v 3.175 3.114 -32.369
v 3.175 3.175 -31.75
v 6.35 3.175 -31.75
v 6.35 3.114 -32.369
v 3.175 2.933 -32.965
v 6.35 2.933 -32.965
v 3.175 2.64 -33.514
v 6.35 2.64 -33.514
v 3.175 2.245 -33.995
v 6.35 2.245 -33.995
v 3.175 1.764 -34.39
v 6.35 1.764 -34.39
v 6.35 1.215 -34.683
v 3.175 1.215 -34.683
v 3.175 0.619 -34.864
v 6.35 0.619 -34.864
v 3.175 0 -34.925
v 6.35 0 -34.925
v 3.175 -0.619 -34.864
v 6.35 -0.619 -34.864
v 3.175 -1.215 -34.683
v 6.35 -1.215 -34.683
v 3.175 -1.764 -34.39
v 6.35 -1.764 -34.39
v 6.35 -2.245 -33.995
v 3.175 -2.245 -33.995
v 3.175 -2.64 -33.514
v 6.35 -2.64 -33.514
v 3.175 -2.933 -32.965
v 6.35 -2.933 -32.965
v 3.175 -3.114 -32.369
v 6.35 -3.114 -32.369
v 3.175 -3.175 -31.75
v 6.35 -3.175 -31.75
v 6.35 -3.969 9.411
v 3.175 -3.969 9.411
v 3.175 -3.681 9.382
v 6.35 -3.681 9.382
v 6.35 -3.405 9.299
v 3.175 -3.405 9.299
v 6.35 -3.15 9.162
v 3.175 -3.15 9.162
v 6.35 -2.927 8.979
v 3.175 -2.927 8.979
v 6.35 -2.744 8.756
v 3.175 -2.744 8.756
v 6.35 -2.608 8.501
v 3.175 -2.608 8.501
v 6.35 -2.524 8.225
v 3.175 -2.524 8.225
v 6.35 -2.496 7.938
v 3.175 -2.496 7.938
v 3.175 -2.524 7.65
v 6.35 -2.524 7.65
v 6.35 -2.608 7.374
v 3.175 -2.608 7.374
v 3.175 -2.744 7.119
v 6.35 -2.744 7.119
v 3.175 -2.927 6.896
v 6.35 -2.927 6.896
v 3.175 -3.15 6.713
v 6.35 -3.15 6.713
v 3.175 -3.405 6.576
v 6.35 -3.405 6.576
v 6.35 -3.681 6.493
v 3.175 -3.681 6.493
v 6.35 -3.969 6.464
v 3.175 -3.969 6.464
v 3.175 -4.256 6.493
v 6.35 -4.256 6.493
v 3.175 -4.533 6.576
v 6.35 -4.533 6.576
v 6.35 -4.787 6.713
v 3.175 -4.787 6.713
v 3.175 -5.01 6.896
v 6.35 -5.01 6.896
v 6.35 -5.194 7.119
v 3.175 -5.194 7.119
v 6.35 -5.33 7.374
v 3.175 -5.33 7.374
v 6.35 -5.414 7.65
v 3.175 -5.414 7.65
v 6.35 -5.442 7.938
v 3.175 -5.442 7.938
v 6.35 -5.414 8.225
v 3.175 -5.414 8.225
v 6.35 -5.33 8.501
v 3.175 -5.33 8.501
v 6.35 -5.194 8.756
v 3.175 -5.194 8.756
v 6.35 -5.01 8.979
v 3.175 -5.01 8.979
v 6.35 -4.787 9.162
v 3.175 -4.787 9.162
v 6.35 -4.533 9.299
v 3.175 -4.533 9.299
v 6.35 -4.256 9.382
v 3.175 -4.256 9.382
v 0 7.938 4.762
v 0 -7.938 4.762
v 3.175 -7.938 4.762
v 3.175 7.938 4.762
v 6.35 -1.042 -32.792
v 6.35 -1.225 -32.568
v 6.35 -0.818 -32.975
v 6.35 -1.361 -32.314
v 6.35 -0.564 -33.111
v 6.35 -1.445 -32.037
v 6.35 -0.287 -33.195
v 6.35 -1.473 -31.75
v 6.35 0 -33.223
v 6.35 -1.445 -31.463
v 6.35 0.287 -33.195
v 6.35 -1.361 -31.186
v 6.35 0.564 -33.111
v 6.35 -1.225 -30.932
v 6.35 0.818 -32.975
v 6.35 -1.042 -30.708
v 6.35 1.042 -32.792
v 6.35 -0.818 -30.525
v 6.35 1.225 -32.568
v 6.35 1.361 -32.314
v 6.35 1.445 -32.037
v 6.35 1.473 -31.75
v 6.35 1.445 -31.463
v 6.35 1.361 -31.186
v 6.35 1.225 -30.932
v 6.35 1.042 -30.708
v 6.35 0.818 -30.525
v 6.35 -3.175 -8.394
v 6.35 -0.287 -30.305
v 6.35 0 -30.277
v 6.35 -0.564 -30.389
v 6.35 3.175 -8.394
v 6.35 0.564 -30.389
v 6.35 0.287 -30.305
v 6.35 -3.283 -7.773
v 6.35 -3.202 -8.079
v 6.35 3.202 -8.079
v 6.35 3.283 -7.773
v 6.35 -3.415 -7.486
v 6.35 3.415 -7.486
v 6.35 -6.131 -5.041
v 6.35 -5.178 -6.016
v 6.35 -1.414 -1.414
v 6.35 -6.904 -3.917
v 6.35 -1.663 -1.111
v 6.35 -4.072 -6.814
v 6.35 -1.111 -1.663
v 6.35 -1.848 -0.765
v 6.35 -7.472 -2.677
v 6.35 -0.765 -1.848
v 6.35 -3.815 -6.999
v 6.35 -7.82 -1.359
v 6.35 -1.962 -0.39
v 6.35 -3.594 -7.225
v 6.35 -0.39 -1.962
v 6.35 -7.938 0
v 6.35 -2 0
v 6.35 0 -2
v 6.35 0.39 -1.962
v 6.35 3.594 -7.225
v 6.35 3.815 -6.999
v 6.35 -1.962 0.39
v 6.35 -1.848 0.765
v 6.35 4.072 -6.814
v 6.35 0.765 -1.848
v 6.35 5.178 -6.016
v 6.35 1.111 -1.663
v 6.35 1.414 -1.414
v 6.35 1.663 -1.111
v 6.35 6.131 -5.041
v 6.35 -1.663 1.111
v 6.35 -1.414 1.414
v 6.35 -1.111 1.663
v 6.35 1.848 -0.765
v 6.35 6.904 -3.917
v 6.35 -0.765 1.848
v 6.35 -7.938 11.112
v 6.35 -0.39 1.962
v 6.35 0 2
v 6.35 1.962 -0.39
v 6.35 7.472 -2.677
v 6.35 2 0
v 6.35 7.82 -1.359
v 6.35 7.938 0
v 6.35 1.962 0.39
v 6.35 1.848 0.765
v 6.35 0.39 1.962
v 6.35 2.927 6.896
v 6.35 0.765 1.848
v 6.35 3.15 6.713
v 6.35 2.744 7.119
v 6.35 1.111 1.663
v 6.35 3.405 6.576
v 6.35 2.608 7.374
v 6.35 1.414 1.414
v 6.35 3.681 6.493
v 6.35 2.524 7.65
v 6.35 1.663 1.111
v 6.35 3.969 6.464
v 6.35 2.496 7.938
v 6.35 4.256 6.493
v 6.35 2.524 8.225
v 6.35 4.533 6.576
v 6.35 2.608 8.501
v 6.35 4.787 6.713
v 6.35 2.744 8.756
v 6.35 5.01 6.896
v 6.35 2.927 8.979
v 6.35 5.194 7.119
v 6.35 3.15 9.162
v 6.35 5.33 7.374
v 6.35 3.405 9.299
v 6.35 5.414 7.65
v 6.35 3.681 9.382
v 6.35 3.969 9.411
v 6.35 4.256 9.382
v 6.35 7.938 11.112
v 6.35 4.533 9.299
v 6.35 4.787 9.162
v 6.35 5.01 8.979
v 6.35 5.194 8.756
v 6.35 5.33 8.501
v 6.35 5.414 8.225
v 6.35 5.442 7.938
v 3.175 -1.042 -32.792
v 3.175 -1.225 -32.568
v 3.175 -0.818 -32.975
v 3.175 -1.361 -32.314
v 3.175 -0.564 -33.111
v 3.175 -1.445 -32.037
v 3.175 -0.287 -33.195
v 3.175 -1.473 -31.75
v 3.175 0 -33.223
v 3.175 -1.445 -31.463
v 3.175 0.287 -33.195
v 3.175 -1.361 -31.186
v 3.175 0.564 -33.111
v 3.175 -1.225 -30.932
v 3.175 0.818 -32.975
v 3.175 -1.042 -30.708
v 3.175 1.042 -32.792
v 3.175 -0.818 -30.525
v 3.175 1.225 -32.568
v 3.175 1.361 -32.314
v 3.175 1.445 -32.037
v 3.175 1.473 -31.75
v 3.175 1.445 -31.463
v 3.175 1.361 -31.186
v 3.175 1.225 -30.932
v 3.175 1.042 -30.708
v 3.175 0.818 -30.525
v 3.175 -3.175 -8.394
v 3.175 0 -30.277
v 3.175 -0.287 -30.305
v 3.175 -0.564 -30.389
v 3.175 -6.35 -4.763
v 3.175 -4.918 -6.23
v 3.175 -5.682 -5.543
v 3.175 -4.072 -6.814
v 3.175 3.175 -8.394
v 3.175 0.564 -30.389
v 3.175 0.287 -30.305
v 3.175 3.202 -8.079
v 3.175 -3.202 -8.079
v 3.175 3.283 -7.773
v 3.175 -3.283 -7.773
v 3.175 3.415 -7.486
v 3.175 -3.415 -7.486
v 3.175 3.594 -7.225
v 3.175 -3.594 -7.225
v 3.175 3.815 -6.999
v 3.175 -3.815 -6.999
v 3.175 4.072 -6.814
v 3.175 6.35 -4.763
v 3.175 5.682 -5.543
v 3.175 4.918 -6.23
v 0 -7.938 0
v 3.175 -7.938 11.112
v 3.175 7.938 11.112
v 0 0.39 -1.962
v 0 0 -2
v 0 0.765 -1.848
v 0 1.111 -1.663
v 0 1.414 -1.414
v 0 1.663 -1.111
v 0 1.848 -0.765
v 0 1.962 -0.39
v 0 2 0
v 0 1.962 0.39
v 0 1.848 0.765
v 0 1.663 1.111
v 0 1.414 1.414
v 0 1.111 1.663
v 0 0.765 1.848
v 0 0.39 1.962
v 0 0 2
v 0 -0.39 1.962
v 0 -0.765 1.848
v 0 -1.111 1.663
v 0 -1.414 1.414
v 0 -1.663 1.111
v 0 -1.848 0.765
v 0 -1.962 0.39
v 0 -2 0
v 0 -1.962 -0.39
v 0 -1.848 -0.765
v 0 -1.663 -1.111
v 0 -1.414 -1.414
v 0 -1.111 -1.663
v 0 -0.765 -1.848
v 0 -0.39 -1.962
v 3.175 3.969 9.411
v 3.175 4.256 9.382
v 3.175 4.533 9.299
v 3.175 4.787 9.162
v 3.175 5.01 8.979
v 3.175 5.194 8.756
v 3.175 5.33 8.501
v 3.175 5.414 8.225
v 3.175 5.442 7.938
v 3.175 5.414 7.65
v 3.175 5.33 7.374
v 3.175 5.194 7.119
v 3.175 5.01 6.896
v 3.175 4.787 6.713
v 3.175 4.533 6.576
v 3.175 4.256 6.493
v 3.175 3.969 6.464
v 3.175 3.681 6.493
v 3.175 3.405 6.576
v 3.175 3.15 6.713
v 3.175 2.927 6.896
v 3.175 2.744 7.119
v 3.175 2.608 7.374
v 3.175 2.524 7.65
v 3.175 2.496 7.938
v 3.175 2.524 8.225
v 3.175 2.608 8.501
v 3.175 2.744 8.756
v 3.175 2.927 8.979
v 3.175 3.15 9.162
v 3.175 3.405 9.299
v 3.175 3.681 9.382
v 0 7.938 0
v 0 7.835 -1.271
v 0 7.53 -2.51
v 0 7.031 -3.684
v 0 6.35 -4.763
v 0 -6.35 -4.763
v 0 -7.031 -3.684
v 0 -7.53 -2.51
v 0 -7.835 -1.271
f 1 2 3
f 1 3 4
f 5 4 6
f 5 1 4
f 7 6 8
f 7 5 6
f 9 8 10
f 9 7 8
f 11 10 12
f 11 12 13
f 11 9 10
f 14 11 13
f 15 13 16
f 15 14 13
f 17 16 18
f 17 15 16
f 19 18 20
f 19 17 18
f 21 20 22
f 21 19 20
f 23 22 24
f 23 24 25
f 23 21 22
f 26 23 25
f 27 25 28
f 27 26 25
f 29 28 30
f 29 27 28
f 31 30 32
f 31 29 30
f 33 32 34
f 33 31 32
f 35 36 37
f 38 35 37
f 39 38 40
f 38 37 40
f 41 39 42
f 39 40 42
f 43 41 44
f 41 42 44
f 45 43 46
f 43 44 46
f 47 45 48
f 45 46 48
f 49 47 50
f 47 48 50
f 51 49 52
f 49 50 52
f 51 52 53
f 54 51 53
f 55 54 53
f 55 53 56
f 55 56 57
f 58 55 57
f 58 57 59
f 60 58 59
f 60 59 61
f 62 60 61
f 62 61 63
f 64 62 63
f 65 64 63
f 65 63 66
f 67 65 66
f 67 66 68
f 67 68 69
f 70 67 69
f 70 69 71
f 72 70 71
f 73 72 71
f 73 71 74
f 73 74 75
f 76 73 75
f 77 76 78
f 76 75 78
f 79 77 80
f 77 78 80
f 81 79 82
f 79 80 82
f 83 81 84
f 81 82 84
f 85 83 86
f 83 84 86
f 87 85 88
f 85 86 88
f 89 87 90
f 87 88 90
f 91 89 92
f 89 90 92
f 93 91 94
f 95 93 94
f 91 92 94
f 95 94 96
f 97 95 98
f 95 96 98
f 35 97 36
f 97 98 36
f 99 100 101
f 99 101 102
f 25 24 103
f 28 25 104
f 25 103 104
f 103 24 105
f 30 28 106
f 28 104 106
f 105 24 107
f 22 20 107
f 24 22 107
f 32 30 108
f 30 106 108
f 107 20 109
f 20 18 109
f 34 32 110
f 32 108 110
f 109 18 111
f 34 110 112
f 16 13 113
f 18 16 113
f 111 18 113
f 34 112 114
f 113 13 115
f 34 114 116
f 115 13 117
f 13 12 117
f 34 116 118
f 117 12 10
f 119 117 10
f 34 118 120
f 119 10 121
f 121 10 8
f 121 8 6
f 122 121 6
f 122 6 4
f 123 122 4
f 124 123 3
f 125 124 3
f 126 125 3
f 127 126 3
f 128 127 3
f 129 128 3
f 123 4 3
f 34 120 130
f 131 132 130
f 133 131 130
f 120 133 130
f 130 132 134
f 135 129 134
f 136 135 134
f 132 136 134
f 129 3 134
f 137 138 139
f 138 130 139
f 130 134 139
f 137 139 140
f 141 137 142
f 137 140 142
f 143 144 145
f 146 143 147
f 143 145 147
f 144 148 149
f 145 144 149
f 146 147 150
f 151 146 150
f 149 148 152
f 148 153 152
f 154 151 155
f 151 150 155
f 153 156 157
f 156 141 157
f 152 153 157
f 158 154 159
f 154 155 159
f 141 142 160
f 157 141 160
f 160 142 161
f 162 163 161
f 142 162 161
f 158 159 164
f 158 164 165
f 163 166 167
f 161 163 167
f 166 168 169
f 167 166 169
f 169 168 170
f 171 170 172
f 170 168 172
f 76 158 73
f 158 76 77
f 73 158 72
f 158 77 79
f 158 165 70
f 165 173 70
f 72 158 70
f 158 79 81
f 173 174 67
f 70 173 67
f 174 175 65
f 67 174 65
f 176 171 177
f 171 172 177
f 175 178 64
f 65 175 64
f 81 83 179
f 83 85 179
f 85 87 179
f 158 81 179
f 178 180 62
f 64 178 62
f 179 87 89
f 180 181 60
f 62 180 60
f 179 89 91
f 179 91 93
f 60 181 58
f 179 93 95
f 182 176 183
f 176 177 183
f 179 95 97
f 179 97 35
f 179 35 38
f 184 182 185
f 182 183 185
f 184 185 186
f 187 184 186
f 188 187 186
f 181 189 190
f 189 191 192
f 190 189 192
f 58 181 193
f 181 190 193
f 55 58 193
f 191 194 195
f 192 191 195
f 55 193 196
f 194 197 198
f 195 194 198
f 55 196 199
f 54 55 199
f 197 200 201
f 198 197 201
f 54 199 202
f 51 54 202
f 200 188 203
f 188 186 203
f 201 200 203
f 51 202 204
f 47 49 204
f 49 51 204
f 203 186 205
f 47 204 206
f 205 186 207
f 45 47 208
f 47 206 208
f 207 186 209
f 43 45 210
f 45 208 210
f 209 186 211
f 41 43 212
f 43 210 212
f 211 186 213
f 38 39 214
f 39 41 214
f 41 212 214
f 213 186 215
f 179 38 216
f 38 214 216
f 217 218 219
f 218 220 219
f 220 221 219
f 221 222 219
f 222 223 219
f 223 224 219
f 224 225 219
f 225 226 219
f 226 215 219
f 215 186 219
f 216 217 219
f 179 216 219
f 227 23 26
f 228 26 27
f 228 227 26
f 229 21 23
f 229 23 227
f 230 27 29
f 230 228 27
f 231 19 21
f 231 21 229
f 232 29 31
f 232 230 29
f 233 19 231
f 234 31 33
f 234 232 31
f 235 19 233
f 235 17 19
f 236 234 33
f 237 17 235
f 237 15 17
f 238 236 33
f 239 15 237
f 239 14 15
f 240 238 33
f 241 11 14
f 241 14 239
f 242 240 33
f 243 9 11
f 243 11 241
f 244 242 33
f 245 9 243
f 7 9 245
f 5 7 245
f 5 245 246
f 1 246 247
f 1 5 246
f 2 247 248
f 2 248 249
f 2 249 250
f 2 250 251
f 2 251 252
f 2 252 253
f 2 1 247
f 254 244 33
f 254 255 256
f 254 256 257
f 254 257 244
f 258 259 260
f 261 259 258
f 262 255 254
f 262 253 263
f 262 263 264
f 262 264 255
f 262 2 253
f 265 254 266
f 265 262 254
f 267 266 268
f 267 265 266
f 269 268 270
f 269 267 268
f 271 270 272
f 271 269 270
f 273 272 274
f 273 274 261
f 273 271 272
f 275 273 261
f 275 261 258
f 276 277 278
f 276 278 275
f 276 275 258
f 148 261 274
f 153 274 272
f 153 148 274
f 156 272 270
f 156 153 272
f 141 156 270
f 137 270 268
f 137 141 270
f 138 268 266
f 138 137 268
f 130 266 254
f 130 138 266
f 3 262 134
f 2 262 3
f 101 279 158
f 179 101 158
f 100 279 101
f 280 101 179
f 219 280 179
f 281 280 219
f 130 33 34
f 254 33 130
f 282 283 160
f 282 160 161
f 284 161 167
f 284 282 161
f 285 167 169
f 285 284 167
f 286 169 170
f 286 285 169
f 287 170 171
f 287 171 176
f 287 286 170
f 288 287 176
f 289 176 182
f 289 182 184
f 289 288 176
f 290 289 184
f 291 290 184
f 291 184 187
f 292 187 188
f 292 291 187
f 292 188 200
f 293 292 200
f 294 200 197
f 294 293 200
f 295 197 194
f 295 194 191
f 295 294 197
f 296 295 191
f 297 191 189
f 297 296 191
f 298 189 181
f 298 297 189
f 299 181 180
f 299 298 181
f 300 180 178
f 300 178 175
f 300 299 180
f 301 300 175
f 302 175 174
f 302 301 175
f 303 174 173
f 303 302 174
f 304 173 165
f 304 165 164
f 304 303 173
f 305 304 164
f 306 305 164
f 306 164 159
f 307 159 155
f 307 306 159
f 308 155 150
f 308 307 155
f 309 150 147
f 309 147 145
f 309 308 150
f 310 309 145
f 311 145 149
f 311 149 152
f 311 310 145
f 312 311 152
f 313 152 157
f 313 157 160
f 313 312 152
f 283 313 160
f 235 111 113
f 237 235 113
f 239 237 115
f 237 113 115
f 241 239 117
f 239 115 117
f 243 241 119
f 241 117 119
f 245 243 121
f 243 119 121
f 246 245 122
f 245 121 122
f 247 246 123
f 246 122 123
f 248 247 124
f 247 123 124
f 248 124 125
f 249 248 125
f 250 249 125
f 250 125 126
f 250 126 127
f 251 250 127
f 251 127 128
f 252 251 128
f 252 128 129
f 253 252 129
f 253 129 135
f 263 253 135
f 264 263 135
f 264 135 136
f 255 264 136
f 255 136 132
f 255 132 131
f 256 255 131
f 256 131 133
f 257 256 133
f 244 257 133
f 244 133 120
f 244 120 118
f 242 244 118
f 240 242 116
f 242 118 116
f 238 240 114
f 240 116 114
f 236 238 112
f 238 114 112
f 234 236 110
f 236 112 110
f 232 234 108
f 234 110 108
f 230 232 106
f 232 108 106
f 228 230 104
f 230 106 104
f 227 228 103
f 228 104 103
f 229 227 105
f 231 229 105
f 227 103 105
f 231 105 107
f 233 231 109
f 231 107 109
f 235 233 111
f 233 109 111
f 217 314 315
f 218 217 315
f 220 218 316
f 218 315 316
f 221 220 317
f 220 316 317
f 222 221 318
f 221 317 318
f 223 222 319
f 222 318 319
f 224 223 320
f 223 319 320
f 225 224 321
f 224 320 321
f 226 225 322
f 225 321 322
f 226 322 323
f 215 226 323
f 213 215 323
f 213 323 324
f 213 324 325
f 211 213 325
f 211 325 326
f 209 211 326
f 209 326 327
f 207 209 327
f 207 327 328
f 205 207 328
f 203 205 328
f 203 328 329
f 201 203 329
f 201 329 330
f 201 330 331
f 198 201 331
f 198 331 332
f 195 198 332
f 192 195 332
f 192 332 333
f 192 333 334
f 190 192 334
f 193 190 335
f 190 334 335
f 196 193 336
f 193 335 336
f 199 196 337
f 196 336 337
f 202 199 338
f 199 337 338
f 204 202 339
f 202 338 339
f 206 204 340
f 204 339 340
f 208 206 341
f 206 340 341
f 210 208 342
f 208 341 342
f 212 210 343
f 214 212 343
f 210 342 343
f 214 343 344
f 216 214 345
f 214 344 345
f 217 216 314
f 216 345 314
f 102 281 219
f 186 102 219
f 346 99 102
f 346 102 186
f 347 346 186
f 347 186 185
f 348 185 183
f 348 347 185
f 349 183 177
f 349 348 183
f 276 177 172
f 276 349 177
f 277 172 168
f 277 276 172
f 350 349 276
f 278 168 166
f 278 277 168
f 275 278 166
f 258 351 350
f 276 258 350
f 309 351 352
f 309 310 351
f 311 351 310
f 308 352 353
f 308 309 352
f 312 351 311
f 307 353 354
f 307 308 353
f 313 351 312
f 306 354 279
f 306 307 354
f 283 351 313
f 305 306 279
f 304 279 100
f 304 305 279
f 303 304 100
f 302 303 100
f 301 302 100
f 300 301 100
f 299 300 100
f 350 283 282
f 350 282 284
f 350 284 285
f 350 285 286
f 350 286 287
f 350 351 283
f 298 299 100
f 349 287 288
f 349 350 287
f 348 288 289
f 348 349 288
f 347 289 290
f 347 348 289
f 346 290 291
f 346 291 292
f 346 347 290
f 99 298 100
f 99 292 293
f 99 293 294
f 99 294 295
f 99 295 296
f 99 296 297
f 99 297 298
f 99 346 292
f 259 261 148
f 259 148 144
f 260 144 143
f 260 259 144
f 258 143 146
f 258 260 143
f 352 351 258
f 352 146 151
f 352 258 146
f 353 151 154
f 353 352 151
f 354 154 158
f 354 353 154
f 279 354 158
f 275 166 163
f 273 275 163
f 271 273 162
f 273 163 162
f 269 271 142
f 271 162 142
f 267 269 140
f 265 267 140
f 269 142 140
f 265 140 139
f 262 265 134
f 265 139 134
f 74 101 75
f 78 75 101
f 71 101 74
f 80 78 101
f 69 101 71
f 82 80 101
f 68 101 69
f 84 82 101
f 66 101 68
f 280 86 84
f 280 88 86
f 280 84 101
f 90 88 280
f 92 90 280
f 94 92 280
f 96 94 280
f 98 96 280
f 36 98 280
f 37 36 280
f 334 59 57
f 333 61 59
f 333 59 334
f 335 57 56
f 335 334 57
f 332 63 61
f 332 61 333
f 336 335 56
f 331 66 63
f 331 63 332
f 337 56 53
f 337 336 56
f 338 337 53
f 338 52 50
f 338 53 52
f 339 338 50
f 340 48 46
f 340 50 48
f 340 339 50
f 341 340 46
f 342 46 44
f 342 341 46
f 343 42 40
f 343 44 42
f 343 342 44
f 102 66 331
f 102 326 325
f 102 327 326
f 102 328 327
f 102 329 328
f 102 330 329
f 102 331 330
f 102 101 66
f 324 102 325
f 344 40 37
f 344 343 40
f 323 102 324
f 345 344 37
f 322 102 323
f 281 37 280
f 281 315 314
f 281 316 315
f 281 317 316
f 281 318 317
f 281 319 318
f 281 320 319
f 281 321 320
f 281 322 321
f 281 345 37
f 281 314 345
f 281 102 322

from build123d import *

# Parameters (mm, degrees)
SKETCH1_R             = 2
BOSS_EXTRUDE1_DEPTH   = 6.35
FILLET1_R             = 1.8415
SKETCH2_W             = 6.35
SKETCH2_H             = 15.875
SKETCH2_W_2           = 42.387227331
SKETCH2_H_2           = 26.263521184
CUT_EXTRUDE1_DEPTH    = 3.175
F_4_CLEARANCE_HOLE1_D = 2.9464
F_4_CLEARANCE_HOLE2_D = 2.9464


with BuildPart() as part:
    # Sketch1 → Boss-Extrude1 (new body)
    with BuildSketch(Plane(origin=(0, 0, 0), x_dir=(0, 0, -1), z_dir=(1, 0, 0))):
        with BuildLine():
            Line((-11.1125, 7.9375), (0, 7.9375))
            ThreePointArc((0, 7.9375), (4.3475478, 6.640988961), (7.274838916, 3.175))
            Line((7.274838916, 3.175), (31.75, 3.175))
            ThreePointArc((31.75, 3.175), (34.925, 0), (31.75, -3.175))
            Line((31.75, -3.175), (7.274838916, -3.175))
            ThreePointArc((7.274838916, -3.175), (4.3475478, -6.640988961), (0, -7.9375))
            Line((0, -7.9375), (-11.1125, -7.9375))
            Line((-11.1125, -7.9375), (-11.1125, 7.9375))
        make_face()
        Circle(SKETCH1_R, mode=Mode.SUBTRACT)
    extrude(amount=BOSS_EXTRUDE1_DEPTH)

    # Fillet1
    fillet1_edges = [part.edges().sort_by_distance(p)[0] for p in [
        (3.175, 3.175, -7.274838916),
        (3.175, -3.175, -7.274838916),
    ]]
    fillet(fillet1_edges, radius=FILLET1_R)

    # Sketch2 → Cut-Extrude1 (cut)
    with BuildSketch(Plane.ZY):
        with Locations((7.9375, 0)):
            Rectangle(SKETCH2_W, SKETCH2_H)
        with Locations((-25.956113666, -1.270701279)):
            Rectangle(SKETCH2_W_2, SKETCH2_H_2)
    extrude(amount=-CUT_EXTRUDE1_DEPTH, mode=Mode.SUBTRACT)

    # #4 Clearance Hole1 (through all)
    with Locations(Plane(origin=(6.35, 0, 0), x_dir=(0, 0, -1), z_dir=(1, 0, 0))):
        with Locations((-7.9375, 3.96875), (-7.9375, -3.96875)):
            Hole(F_4_CLEARANCE_HOLE1_D / 2)

    # #4 Clearance Hole2 (through all)
    with Locations(Plane.ZY.offset(-3.175)):
        with Locations((-31.75, 0)):
            Hole(F_4_CLEARANCE_HOLE2_D / 2)


solid = part.part
